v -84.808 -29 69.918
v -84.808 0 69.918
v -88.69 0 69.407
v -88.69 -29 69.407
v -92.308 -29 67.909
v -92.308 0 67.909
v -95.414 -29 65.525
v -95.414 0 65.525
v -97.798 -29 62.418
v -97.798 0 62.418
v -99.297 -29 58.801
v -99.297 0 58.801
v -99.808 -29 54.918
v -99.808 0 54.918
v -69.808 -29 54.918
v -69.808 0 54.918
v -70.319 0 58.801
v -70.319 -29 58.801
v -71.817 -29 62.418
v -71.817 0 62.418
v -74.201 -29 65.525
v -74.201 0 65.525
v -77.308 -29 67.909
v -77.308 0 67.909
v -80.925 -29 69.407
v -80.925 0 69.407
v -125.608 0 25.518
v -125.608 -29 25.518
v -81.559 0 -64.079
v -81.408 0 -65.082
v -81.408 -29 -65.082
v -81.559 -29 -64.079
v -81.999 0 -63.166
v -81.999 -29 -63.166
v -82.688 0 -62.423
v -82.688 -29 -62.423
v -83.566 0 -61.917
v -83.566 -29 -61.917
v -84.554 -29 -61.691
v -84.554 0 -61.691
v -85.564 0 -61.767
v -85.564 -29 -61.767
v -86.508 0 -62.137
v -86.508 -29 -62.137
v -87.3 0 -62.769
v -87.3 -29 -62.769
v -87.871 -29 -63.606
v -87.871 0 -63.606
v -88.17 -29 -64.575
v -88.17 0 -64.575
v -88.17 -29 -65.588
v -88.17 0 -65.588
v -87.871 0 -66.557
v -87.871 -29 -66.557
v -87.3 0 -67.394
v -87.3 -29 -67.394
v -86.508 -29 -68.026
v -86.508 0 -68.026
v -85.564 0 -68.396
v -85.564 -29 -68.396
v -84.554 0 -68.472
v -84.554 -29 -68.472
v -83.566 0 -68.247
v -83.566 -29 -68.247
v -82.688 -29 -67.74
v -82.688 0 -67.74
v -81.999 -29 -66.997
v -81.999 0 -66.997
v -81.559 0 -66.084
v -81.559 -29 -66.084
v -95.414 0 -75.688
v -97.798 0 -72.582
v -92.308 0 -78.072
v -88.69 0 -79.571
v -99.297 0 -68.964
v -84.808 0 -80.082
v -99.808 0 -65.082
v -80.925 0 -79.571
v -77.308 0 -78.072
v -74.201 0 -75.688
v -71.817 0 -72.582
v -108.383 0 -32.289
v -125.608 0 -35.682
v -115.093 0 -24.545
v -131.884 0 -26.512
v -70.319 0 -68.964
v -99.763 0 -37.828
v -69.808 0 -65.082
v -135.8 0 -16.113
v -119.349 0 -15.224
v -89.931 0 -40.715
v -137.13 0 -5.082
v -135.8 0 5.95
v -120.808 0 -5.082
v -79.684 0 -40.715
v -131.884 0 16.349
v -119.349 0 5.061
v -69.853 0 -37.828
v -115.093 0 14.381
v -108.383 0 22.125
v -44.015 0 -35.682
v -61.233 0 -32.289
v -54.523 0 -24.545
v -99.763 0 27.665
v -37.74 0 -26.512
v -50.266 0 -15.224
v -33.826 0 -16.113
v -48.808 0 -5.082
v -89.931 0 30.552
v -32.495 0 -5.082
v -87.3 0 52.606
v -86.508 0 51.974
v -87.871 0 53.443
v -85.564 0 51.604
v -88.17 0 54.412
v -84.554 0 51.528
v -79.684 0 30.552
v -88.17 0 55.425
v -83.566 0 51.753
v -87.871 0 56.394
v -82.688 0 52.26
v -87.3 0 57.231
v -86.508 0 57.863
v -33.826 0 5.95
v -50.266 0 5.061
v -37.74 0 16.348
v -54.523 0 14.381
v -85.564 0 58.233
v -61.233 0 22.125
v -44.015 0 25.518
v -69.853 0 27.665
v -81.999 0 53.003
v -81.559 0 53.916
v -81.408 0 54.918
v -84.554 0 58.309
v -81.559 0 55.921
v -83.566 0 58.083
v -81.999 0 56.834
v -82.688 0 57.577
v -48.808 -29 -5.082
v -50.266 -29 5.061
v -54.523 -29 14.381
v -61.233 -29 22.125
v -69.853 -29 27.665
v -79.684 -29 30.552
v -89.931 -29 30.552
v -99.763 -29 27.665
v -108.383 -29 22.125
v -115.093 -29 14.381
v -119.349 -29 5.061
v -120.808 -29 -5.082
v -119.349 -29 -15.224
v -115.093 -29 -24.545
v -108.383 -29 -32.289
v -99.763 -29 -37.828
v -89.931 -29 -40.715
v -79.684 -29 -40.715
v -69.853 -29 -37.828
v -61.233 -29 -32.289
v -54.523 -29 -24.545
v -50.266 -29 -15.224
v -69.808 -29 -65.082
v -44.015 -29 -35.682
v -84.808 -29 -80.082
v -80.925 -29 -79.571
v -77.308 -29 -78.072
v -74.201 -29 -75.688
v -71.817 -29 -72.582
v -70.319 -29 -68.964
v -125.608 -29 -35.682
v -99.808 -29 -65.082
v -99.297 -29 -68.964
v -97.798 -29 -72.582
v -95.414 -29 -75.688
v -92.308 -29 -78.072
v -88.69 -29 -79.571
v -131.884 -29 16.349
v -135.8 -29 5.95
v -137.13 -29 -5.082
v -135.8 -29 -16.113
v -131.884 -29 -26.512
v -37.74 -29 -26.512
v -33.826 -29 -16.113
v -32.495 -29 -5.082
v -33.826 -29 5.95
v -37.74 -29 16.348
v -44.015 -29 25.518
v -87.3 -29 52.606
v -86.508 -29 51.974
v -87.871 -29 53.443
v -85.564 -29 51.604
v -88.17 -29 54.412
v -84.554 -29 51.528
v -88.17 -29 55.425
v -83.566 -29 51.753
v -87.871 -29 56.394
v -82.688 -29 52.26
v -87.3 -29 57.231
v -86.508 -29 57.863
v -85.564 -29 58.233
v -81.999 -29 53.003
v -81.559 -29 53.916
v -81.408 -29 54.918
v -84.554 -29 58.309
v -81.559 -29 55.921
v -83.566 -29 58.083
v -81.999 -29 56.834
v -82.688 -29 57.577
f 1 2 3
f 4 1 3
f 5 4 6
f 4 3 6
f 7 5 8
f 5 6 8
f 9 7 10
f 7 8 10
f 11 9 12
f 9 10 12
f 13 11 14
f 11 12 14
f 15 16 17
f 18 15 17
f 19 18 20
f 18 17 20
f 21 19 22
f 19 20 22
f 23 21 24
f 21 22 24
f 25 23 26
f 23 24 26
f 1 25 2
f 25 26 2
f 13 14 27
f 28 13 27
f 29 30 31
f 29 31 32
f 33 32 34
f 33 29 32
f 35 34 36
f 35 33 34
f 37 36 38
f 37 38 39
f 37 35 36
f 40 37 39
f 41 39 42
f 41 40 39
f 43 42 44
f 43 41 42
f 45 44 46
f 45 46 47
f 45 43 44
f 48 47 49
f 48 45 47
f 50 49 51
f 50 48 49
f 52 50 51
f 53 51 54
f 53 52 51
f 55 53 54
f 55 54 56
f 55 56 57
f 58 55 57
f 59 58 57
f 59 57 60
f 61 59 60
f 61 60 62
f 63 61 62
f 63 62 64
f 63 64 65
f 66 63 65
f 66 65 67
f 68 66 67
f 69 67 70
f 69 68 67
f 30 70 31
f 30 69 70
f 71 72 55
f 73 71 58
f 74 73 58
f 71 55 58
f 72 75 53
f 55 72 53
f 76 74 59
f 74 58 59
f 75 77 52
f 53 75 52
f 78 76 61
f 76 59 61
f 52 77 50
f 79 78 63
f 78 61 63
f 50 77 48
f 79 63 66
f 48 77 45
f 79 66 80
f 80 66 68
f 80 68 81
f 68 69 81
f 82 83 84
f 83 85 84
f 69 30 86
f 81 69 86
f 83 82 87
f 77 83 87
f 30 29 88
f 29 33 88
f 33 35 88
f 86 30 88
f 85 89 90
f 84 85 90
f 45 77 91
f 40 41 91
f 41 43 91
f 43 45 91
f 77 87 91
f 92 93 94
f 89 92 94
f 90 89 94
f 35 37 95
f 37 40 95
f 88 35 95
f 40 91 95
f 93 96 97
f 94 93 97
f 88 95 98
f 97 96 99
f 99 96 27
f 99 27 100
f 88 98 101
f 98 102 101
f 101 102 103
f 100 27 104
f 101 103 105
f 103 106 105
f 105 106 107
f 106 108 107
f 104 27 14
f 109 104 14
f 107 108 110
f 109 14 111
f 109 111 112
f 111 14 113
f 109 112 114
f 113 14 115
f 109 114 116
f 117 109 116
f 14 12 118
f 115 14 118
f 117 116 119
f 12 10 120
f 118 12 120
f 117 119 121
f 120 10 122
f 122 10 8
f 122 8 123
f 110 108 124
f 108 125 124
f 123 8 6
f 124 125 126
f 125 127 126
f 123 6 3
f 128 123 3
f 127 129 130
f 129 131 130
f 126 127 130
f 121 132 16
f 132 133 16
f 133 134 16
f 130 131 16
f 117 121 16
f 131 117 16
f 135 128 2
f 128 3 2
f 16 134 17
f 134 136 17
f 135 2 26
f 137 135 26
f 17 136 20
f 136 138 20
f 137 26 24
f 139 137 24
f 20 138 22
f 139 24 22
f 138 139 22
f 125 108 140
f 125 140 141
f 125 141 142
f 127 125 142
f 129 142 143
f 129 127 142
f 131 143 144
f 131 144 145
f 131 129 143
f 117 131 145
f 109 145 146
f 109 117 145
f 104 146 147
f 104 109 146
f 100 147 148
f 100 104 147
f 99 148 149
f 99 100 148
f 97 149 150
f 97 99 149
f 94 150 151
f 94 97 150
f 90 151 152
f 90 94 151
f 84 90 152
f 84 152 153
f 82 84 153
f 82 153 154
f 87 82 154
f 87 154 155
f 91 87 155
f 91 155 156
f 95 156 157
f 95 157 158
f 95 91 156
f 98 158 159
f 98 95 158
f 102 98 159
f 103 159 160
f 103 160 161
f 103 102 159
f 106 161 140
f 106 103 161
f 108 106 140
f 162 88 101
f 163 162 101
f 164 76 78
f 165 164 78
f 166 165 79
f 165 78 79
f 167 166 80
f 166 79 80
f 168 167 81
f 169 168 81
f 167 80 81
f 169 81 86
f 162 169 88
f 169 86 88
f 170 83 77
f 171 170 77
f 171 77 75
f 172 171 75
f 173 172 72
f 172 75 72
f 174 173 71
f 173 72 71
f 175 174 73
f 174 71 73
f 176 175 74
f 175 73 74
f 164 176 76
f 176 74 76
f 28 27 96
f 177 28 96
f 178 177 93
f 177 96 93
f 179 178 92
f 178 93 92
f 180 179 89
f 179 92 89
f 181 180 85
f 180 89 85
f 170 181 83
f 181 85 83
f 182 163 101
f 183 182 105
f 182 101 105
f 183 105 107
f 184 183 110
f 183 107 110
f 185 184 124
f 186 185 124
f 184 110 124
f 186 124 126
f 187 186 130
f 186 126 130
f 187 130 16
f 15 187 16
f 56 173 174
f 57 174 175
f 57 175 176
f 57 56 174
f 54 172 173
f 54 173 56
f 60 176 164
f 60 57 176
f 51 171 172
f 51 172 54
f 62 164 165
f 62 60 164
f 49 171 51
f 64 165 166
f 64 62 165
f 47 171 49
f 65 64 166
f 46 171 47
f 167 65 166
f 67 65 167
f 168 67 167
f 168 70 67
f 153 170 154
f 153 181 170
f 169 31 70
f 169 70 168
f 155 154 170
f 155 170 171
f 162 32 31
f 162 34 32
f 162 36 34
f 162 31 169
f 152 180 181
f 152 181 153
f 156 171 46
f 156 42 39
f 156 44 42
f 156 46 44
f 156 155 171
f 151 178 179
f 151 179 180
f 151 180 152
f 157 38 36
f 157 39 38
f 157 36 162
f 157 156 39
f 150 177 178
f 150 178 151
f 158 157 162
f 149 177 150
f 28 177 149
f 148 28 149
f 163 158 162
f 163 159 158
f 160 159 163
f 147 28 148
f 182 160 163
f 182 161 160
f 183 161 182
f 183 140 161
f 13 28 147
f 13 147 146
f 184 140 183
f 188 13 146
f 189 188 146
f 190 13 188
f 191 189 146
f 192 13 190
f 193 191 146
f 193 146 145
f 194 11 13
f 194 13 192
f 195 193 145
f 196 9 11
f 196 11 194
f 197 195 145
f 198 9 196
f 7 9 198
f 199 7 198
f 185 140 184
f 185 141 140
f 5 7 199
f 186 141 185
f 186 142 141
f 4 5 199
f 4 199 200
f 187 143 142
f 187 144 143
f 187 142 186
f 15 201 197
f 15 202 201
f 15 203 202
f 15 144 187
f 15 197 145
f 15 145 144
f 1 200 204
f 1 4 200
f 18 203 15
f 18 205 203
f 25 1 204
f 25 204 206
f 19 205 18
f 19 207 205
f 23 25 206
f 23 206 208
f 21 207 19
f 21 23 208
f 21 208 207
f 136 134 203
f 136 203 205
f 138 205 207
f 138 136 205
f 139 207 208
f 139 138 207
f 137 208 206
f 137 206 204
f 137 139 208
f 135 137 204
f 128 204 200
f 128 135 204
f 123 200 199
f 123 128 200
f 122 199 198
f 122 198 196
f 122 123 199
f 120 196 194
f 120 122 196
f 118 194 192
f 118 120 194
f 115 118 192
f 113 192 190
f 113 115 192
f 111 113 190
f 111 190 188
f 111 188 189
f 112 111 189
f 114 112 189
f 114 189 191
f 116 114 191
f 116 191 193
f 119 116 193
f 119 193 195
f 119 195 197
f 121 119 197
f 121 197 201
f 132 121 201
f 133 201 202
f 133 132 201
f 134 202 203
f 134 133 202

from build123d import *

# Parameters (mm, degrees)
F0_R     = 3.4
F0_R_2   = 36
F1_DEPTH = 29


with BuildPart() as f1:
    # F0 (on Front) → F1 (new body)
    with BuildSketch(Plane.XZ):
        with BuildLine():
            ThreePointArc((-99.807744, -65.08165), (-95.414346, -75.688252), (-84.807744, -80.08165))
            ThreePointArc((-84.807744, -80.08165), (-74.201142, -75.688252), (-69.807744, -65.08165))
            Line((-69.807744, -65.08165), (-44.015344, -35.68165))
            ThreePointArc((-44.015344, -35.68165), (-32.495199, -5.08165), (-44.015344, 25.51835))
            Line((-44.015344, 25.51835), (-69.807744, 54.91835))
            ThreePointArc((-69.807744, 54.91835), (-74.201142, 65.524952), (-84.807744, 69.91835))
            ThreePointArc((-84.807744, 69.91835), (-95.414346, 65.524952), (-99.807744, 54.91835))
            Line((-99.807744, 54.91835), (-125.607744, 25.51835))
            ThreePointArc((-125.607744, 25.51835), (-137.13044, -5.08165), (-125.607744, -35.68165))
            Line((-125.607744, -35.68165), (-99.807744, -65.08165))
        make_face()
        with Locations((-84.807744, -65.08165)):
            Circle(F0_R, mode=Mode.SUBTRACT)
        with Locations((-84.807744, -5.08165)):
            Circle(F0_R_2, mode=Mode.SUBTRACT)
        with Locations((-84.807744, 54.91835)):
            Circle(F0_R, mode=Mode.SUBTRACT)
    extrude(amount=F1_DEPTH)


solid = f1.part
